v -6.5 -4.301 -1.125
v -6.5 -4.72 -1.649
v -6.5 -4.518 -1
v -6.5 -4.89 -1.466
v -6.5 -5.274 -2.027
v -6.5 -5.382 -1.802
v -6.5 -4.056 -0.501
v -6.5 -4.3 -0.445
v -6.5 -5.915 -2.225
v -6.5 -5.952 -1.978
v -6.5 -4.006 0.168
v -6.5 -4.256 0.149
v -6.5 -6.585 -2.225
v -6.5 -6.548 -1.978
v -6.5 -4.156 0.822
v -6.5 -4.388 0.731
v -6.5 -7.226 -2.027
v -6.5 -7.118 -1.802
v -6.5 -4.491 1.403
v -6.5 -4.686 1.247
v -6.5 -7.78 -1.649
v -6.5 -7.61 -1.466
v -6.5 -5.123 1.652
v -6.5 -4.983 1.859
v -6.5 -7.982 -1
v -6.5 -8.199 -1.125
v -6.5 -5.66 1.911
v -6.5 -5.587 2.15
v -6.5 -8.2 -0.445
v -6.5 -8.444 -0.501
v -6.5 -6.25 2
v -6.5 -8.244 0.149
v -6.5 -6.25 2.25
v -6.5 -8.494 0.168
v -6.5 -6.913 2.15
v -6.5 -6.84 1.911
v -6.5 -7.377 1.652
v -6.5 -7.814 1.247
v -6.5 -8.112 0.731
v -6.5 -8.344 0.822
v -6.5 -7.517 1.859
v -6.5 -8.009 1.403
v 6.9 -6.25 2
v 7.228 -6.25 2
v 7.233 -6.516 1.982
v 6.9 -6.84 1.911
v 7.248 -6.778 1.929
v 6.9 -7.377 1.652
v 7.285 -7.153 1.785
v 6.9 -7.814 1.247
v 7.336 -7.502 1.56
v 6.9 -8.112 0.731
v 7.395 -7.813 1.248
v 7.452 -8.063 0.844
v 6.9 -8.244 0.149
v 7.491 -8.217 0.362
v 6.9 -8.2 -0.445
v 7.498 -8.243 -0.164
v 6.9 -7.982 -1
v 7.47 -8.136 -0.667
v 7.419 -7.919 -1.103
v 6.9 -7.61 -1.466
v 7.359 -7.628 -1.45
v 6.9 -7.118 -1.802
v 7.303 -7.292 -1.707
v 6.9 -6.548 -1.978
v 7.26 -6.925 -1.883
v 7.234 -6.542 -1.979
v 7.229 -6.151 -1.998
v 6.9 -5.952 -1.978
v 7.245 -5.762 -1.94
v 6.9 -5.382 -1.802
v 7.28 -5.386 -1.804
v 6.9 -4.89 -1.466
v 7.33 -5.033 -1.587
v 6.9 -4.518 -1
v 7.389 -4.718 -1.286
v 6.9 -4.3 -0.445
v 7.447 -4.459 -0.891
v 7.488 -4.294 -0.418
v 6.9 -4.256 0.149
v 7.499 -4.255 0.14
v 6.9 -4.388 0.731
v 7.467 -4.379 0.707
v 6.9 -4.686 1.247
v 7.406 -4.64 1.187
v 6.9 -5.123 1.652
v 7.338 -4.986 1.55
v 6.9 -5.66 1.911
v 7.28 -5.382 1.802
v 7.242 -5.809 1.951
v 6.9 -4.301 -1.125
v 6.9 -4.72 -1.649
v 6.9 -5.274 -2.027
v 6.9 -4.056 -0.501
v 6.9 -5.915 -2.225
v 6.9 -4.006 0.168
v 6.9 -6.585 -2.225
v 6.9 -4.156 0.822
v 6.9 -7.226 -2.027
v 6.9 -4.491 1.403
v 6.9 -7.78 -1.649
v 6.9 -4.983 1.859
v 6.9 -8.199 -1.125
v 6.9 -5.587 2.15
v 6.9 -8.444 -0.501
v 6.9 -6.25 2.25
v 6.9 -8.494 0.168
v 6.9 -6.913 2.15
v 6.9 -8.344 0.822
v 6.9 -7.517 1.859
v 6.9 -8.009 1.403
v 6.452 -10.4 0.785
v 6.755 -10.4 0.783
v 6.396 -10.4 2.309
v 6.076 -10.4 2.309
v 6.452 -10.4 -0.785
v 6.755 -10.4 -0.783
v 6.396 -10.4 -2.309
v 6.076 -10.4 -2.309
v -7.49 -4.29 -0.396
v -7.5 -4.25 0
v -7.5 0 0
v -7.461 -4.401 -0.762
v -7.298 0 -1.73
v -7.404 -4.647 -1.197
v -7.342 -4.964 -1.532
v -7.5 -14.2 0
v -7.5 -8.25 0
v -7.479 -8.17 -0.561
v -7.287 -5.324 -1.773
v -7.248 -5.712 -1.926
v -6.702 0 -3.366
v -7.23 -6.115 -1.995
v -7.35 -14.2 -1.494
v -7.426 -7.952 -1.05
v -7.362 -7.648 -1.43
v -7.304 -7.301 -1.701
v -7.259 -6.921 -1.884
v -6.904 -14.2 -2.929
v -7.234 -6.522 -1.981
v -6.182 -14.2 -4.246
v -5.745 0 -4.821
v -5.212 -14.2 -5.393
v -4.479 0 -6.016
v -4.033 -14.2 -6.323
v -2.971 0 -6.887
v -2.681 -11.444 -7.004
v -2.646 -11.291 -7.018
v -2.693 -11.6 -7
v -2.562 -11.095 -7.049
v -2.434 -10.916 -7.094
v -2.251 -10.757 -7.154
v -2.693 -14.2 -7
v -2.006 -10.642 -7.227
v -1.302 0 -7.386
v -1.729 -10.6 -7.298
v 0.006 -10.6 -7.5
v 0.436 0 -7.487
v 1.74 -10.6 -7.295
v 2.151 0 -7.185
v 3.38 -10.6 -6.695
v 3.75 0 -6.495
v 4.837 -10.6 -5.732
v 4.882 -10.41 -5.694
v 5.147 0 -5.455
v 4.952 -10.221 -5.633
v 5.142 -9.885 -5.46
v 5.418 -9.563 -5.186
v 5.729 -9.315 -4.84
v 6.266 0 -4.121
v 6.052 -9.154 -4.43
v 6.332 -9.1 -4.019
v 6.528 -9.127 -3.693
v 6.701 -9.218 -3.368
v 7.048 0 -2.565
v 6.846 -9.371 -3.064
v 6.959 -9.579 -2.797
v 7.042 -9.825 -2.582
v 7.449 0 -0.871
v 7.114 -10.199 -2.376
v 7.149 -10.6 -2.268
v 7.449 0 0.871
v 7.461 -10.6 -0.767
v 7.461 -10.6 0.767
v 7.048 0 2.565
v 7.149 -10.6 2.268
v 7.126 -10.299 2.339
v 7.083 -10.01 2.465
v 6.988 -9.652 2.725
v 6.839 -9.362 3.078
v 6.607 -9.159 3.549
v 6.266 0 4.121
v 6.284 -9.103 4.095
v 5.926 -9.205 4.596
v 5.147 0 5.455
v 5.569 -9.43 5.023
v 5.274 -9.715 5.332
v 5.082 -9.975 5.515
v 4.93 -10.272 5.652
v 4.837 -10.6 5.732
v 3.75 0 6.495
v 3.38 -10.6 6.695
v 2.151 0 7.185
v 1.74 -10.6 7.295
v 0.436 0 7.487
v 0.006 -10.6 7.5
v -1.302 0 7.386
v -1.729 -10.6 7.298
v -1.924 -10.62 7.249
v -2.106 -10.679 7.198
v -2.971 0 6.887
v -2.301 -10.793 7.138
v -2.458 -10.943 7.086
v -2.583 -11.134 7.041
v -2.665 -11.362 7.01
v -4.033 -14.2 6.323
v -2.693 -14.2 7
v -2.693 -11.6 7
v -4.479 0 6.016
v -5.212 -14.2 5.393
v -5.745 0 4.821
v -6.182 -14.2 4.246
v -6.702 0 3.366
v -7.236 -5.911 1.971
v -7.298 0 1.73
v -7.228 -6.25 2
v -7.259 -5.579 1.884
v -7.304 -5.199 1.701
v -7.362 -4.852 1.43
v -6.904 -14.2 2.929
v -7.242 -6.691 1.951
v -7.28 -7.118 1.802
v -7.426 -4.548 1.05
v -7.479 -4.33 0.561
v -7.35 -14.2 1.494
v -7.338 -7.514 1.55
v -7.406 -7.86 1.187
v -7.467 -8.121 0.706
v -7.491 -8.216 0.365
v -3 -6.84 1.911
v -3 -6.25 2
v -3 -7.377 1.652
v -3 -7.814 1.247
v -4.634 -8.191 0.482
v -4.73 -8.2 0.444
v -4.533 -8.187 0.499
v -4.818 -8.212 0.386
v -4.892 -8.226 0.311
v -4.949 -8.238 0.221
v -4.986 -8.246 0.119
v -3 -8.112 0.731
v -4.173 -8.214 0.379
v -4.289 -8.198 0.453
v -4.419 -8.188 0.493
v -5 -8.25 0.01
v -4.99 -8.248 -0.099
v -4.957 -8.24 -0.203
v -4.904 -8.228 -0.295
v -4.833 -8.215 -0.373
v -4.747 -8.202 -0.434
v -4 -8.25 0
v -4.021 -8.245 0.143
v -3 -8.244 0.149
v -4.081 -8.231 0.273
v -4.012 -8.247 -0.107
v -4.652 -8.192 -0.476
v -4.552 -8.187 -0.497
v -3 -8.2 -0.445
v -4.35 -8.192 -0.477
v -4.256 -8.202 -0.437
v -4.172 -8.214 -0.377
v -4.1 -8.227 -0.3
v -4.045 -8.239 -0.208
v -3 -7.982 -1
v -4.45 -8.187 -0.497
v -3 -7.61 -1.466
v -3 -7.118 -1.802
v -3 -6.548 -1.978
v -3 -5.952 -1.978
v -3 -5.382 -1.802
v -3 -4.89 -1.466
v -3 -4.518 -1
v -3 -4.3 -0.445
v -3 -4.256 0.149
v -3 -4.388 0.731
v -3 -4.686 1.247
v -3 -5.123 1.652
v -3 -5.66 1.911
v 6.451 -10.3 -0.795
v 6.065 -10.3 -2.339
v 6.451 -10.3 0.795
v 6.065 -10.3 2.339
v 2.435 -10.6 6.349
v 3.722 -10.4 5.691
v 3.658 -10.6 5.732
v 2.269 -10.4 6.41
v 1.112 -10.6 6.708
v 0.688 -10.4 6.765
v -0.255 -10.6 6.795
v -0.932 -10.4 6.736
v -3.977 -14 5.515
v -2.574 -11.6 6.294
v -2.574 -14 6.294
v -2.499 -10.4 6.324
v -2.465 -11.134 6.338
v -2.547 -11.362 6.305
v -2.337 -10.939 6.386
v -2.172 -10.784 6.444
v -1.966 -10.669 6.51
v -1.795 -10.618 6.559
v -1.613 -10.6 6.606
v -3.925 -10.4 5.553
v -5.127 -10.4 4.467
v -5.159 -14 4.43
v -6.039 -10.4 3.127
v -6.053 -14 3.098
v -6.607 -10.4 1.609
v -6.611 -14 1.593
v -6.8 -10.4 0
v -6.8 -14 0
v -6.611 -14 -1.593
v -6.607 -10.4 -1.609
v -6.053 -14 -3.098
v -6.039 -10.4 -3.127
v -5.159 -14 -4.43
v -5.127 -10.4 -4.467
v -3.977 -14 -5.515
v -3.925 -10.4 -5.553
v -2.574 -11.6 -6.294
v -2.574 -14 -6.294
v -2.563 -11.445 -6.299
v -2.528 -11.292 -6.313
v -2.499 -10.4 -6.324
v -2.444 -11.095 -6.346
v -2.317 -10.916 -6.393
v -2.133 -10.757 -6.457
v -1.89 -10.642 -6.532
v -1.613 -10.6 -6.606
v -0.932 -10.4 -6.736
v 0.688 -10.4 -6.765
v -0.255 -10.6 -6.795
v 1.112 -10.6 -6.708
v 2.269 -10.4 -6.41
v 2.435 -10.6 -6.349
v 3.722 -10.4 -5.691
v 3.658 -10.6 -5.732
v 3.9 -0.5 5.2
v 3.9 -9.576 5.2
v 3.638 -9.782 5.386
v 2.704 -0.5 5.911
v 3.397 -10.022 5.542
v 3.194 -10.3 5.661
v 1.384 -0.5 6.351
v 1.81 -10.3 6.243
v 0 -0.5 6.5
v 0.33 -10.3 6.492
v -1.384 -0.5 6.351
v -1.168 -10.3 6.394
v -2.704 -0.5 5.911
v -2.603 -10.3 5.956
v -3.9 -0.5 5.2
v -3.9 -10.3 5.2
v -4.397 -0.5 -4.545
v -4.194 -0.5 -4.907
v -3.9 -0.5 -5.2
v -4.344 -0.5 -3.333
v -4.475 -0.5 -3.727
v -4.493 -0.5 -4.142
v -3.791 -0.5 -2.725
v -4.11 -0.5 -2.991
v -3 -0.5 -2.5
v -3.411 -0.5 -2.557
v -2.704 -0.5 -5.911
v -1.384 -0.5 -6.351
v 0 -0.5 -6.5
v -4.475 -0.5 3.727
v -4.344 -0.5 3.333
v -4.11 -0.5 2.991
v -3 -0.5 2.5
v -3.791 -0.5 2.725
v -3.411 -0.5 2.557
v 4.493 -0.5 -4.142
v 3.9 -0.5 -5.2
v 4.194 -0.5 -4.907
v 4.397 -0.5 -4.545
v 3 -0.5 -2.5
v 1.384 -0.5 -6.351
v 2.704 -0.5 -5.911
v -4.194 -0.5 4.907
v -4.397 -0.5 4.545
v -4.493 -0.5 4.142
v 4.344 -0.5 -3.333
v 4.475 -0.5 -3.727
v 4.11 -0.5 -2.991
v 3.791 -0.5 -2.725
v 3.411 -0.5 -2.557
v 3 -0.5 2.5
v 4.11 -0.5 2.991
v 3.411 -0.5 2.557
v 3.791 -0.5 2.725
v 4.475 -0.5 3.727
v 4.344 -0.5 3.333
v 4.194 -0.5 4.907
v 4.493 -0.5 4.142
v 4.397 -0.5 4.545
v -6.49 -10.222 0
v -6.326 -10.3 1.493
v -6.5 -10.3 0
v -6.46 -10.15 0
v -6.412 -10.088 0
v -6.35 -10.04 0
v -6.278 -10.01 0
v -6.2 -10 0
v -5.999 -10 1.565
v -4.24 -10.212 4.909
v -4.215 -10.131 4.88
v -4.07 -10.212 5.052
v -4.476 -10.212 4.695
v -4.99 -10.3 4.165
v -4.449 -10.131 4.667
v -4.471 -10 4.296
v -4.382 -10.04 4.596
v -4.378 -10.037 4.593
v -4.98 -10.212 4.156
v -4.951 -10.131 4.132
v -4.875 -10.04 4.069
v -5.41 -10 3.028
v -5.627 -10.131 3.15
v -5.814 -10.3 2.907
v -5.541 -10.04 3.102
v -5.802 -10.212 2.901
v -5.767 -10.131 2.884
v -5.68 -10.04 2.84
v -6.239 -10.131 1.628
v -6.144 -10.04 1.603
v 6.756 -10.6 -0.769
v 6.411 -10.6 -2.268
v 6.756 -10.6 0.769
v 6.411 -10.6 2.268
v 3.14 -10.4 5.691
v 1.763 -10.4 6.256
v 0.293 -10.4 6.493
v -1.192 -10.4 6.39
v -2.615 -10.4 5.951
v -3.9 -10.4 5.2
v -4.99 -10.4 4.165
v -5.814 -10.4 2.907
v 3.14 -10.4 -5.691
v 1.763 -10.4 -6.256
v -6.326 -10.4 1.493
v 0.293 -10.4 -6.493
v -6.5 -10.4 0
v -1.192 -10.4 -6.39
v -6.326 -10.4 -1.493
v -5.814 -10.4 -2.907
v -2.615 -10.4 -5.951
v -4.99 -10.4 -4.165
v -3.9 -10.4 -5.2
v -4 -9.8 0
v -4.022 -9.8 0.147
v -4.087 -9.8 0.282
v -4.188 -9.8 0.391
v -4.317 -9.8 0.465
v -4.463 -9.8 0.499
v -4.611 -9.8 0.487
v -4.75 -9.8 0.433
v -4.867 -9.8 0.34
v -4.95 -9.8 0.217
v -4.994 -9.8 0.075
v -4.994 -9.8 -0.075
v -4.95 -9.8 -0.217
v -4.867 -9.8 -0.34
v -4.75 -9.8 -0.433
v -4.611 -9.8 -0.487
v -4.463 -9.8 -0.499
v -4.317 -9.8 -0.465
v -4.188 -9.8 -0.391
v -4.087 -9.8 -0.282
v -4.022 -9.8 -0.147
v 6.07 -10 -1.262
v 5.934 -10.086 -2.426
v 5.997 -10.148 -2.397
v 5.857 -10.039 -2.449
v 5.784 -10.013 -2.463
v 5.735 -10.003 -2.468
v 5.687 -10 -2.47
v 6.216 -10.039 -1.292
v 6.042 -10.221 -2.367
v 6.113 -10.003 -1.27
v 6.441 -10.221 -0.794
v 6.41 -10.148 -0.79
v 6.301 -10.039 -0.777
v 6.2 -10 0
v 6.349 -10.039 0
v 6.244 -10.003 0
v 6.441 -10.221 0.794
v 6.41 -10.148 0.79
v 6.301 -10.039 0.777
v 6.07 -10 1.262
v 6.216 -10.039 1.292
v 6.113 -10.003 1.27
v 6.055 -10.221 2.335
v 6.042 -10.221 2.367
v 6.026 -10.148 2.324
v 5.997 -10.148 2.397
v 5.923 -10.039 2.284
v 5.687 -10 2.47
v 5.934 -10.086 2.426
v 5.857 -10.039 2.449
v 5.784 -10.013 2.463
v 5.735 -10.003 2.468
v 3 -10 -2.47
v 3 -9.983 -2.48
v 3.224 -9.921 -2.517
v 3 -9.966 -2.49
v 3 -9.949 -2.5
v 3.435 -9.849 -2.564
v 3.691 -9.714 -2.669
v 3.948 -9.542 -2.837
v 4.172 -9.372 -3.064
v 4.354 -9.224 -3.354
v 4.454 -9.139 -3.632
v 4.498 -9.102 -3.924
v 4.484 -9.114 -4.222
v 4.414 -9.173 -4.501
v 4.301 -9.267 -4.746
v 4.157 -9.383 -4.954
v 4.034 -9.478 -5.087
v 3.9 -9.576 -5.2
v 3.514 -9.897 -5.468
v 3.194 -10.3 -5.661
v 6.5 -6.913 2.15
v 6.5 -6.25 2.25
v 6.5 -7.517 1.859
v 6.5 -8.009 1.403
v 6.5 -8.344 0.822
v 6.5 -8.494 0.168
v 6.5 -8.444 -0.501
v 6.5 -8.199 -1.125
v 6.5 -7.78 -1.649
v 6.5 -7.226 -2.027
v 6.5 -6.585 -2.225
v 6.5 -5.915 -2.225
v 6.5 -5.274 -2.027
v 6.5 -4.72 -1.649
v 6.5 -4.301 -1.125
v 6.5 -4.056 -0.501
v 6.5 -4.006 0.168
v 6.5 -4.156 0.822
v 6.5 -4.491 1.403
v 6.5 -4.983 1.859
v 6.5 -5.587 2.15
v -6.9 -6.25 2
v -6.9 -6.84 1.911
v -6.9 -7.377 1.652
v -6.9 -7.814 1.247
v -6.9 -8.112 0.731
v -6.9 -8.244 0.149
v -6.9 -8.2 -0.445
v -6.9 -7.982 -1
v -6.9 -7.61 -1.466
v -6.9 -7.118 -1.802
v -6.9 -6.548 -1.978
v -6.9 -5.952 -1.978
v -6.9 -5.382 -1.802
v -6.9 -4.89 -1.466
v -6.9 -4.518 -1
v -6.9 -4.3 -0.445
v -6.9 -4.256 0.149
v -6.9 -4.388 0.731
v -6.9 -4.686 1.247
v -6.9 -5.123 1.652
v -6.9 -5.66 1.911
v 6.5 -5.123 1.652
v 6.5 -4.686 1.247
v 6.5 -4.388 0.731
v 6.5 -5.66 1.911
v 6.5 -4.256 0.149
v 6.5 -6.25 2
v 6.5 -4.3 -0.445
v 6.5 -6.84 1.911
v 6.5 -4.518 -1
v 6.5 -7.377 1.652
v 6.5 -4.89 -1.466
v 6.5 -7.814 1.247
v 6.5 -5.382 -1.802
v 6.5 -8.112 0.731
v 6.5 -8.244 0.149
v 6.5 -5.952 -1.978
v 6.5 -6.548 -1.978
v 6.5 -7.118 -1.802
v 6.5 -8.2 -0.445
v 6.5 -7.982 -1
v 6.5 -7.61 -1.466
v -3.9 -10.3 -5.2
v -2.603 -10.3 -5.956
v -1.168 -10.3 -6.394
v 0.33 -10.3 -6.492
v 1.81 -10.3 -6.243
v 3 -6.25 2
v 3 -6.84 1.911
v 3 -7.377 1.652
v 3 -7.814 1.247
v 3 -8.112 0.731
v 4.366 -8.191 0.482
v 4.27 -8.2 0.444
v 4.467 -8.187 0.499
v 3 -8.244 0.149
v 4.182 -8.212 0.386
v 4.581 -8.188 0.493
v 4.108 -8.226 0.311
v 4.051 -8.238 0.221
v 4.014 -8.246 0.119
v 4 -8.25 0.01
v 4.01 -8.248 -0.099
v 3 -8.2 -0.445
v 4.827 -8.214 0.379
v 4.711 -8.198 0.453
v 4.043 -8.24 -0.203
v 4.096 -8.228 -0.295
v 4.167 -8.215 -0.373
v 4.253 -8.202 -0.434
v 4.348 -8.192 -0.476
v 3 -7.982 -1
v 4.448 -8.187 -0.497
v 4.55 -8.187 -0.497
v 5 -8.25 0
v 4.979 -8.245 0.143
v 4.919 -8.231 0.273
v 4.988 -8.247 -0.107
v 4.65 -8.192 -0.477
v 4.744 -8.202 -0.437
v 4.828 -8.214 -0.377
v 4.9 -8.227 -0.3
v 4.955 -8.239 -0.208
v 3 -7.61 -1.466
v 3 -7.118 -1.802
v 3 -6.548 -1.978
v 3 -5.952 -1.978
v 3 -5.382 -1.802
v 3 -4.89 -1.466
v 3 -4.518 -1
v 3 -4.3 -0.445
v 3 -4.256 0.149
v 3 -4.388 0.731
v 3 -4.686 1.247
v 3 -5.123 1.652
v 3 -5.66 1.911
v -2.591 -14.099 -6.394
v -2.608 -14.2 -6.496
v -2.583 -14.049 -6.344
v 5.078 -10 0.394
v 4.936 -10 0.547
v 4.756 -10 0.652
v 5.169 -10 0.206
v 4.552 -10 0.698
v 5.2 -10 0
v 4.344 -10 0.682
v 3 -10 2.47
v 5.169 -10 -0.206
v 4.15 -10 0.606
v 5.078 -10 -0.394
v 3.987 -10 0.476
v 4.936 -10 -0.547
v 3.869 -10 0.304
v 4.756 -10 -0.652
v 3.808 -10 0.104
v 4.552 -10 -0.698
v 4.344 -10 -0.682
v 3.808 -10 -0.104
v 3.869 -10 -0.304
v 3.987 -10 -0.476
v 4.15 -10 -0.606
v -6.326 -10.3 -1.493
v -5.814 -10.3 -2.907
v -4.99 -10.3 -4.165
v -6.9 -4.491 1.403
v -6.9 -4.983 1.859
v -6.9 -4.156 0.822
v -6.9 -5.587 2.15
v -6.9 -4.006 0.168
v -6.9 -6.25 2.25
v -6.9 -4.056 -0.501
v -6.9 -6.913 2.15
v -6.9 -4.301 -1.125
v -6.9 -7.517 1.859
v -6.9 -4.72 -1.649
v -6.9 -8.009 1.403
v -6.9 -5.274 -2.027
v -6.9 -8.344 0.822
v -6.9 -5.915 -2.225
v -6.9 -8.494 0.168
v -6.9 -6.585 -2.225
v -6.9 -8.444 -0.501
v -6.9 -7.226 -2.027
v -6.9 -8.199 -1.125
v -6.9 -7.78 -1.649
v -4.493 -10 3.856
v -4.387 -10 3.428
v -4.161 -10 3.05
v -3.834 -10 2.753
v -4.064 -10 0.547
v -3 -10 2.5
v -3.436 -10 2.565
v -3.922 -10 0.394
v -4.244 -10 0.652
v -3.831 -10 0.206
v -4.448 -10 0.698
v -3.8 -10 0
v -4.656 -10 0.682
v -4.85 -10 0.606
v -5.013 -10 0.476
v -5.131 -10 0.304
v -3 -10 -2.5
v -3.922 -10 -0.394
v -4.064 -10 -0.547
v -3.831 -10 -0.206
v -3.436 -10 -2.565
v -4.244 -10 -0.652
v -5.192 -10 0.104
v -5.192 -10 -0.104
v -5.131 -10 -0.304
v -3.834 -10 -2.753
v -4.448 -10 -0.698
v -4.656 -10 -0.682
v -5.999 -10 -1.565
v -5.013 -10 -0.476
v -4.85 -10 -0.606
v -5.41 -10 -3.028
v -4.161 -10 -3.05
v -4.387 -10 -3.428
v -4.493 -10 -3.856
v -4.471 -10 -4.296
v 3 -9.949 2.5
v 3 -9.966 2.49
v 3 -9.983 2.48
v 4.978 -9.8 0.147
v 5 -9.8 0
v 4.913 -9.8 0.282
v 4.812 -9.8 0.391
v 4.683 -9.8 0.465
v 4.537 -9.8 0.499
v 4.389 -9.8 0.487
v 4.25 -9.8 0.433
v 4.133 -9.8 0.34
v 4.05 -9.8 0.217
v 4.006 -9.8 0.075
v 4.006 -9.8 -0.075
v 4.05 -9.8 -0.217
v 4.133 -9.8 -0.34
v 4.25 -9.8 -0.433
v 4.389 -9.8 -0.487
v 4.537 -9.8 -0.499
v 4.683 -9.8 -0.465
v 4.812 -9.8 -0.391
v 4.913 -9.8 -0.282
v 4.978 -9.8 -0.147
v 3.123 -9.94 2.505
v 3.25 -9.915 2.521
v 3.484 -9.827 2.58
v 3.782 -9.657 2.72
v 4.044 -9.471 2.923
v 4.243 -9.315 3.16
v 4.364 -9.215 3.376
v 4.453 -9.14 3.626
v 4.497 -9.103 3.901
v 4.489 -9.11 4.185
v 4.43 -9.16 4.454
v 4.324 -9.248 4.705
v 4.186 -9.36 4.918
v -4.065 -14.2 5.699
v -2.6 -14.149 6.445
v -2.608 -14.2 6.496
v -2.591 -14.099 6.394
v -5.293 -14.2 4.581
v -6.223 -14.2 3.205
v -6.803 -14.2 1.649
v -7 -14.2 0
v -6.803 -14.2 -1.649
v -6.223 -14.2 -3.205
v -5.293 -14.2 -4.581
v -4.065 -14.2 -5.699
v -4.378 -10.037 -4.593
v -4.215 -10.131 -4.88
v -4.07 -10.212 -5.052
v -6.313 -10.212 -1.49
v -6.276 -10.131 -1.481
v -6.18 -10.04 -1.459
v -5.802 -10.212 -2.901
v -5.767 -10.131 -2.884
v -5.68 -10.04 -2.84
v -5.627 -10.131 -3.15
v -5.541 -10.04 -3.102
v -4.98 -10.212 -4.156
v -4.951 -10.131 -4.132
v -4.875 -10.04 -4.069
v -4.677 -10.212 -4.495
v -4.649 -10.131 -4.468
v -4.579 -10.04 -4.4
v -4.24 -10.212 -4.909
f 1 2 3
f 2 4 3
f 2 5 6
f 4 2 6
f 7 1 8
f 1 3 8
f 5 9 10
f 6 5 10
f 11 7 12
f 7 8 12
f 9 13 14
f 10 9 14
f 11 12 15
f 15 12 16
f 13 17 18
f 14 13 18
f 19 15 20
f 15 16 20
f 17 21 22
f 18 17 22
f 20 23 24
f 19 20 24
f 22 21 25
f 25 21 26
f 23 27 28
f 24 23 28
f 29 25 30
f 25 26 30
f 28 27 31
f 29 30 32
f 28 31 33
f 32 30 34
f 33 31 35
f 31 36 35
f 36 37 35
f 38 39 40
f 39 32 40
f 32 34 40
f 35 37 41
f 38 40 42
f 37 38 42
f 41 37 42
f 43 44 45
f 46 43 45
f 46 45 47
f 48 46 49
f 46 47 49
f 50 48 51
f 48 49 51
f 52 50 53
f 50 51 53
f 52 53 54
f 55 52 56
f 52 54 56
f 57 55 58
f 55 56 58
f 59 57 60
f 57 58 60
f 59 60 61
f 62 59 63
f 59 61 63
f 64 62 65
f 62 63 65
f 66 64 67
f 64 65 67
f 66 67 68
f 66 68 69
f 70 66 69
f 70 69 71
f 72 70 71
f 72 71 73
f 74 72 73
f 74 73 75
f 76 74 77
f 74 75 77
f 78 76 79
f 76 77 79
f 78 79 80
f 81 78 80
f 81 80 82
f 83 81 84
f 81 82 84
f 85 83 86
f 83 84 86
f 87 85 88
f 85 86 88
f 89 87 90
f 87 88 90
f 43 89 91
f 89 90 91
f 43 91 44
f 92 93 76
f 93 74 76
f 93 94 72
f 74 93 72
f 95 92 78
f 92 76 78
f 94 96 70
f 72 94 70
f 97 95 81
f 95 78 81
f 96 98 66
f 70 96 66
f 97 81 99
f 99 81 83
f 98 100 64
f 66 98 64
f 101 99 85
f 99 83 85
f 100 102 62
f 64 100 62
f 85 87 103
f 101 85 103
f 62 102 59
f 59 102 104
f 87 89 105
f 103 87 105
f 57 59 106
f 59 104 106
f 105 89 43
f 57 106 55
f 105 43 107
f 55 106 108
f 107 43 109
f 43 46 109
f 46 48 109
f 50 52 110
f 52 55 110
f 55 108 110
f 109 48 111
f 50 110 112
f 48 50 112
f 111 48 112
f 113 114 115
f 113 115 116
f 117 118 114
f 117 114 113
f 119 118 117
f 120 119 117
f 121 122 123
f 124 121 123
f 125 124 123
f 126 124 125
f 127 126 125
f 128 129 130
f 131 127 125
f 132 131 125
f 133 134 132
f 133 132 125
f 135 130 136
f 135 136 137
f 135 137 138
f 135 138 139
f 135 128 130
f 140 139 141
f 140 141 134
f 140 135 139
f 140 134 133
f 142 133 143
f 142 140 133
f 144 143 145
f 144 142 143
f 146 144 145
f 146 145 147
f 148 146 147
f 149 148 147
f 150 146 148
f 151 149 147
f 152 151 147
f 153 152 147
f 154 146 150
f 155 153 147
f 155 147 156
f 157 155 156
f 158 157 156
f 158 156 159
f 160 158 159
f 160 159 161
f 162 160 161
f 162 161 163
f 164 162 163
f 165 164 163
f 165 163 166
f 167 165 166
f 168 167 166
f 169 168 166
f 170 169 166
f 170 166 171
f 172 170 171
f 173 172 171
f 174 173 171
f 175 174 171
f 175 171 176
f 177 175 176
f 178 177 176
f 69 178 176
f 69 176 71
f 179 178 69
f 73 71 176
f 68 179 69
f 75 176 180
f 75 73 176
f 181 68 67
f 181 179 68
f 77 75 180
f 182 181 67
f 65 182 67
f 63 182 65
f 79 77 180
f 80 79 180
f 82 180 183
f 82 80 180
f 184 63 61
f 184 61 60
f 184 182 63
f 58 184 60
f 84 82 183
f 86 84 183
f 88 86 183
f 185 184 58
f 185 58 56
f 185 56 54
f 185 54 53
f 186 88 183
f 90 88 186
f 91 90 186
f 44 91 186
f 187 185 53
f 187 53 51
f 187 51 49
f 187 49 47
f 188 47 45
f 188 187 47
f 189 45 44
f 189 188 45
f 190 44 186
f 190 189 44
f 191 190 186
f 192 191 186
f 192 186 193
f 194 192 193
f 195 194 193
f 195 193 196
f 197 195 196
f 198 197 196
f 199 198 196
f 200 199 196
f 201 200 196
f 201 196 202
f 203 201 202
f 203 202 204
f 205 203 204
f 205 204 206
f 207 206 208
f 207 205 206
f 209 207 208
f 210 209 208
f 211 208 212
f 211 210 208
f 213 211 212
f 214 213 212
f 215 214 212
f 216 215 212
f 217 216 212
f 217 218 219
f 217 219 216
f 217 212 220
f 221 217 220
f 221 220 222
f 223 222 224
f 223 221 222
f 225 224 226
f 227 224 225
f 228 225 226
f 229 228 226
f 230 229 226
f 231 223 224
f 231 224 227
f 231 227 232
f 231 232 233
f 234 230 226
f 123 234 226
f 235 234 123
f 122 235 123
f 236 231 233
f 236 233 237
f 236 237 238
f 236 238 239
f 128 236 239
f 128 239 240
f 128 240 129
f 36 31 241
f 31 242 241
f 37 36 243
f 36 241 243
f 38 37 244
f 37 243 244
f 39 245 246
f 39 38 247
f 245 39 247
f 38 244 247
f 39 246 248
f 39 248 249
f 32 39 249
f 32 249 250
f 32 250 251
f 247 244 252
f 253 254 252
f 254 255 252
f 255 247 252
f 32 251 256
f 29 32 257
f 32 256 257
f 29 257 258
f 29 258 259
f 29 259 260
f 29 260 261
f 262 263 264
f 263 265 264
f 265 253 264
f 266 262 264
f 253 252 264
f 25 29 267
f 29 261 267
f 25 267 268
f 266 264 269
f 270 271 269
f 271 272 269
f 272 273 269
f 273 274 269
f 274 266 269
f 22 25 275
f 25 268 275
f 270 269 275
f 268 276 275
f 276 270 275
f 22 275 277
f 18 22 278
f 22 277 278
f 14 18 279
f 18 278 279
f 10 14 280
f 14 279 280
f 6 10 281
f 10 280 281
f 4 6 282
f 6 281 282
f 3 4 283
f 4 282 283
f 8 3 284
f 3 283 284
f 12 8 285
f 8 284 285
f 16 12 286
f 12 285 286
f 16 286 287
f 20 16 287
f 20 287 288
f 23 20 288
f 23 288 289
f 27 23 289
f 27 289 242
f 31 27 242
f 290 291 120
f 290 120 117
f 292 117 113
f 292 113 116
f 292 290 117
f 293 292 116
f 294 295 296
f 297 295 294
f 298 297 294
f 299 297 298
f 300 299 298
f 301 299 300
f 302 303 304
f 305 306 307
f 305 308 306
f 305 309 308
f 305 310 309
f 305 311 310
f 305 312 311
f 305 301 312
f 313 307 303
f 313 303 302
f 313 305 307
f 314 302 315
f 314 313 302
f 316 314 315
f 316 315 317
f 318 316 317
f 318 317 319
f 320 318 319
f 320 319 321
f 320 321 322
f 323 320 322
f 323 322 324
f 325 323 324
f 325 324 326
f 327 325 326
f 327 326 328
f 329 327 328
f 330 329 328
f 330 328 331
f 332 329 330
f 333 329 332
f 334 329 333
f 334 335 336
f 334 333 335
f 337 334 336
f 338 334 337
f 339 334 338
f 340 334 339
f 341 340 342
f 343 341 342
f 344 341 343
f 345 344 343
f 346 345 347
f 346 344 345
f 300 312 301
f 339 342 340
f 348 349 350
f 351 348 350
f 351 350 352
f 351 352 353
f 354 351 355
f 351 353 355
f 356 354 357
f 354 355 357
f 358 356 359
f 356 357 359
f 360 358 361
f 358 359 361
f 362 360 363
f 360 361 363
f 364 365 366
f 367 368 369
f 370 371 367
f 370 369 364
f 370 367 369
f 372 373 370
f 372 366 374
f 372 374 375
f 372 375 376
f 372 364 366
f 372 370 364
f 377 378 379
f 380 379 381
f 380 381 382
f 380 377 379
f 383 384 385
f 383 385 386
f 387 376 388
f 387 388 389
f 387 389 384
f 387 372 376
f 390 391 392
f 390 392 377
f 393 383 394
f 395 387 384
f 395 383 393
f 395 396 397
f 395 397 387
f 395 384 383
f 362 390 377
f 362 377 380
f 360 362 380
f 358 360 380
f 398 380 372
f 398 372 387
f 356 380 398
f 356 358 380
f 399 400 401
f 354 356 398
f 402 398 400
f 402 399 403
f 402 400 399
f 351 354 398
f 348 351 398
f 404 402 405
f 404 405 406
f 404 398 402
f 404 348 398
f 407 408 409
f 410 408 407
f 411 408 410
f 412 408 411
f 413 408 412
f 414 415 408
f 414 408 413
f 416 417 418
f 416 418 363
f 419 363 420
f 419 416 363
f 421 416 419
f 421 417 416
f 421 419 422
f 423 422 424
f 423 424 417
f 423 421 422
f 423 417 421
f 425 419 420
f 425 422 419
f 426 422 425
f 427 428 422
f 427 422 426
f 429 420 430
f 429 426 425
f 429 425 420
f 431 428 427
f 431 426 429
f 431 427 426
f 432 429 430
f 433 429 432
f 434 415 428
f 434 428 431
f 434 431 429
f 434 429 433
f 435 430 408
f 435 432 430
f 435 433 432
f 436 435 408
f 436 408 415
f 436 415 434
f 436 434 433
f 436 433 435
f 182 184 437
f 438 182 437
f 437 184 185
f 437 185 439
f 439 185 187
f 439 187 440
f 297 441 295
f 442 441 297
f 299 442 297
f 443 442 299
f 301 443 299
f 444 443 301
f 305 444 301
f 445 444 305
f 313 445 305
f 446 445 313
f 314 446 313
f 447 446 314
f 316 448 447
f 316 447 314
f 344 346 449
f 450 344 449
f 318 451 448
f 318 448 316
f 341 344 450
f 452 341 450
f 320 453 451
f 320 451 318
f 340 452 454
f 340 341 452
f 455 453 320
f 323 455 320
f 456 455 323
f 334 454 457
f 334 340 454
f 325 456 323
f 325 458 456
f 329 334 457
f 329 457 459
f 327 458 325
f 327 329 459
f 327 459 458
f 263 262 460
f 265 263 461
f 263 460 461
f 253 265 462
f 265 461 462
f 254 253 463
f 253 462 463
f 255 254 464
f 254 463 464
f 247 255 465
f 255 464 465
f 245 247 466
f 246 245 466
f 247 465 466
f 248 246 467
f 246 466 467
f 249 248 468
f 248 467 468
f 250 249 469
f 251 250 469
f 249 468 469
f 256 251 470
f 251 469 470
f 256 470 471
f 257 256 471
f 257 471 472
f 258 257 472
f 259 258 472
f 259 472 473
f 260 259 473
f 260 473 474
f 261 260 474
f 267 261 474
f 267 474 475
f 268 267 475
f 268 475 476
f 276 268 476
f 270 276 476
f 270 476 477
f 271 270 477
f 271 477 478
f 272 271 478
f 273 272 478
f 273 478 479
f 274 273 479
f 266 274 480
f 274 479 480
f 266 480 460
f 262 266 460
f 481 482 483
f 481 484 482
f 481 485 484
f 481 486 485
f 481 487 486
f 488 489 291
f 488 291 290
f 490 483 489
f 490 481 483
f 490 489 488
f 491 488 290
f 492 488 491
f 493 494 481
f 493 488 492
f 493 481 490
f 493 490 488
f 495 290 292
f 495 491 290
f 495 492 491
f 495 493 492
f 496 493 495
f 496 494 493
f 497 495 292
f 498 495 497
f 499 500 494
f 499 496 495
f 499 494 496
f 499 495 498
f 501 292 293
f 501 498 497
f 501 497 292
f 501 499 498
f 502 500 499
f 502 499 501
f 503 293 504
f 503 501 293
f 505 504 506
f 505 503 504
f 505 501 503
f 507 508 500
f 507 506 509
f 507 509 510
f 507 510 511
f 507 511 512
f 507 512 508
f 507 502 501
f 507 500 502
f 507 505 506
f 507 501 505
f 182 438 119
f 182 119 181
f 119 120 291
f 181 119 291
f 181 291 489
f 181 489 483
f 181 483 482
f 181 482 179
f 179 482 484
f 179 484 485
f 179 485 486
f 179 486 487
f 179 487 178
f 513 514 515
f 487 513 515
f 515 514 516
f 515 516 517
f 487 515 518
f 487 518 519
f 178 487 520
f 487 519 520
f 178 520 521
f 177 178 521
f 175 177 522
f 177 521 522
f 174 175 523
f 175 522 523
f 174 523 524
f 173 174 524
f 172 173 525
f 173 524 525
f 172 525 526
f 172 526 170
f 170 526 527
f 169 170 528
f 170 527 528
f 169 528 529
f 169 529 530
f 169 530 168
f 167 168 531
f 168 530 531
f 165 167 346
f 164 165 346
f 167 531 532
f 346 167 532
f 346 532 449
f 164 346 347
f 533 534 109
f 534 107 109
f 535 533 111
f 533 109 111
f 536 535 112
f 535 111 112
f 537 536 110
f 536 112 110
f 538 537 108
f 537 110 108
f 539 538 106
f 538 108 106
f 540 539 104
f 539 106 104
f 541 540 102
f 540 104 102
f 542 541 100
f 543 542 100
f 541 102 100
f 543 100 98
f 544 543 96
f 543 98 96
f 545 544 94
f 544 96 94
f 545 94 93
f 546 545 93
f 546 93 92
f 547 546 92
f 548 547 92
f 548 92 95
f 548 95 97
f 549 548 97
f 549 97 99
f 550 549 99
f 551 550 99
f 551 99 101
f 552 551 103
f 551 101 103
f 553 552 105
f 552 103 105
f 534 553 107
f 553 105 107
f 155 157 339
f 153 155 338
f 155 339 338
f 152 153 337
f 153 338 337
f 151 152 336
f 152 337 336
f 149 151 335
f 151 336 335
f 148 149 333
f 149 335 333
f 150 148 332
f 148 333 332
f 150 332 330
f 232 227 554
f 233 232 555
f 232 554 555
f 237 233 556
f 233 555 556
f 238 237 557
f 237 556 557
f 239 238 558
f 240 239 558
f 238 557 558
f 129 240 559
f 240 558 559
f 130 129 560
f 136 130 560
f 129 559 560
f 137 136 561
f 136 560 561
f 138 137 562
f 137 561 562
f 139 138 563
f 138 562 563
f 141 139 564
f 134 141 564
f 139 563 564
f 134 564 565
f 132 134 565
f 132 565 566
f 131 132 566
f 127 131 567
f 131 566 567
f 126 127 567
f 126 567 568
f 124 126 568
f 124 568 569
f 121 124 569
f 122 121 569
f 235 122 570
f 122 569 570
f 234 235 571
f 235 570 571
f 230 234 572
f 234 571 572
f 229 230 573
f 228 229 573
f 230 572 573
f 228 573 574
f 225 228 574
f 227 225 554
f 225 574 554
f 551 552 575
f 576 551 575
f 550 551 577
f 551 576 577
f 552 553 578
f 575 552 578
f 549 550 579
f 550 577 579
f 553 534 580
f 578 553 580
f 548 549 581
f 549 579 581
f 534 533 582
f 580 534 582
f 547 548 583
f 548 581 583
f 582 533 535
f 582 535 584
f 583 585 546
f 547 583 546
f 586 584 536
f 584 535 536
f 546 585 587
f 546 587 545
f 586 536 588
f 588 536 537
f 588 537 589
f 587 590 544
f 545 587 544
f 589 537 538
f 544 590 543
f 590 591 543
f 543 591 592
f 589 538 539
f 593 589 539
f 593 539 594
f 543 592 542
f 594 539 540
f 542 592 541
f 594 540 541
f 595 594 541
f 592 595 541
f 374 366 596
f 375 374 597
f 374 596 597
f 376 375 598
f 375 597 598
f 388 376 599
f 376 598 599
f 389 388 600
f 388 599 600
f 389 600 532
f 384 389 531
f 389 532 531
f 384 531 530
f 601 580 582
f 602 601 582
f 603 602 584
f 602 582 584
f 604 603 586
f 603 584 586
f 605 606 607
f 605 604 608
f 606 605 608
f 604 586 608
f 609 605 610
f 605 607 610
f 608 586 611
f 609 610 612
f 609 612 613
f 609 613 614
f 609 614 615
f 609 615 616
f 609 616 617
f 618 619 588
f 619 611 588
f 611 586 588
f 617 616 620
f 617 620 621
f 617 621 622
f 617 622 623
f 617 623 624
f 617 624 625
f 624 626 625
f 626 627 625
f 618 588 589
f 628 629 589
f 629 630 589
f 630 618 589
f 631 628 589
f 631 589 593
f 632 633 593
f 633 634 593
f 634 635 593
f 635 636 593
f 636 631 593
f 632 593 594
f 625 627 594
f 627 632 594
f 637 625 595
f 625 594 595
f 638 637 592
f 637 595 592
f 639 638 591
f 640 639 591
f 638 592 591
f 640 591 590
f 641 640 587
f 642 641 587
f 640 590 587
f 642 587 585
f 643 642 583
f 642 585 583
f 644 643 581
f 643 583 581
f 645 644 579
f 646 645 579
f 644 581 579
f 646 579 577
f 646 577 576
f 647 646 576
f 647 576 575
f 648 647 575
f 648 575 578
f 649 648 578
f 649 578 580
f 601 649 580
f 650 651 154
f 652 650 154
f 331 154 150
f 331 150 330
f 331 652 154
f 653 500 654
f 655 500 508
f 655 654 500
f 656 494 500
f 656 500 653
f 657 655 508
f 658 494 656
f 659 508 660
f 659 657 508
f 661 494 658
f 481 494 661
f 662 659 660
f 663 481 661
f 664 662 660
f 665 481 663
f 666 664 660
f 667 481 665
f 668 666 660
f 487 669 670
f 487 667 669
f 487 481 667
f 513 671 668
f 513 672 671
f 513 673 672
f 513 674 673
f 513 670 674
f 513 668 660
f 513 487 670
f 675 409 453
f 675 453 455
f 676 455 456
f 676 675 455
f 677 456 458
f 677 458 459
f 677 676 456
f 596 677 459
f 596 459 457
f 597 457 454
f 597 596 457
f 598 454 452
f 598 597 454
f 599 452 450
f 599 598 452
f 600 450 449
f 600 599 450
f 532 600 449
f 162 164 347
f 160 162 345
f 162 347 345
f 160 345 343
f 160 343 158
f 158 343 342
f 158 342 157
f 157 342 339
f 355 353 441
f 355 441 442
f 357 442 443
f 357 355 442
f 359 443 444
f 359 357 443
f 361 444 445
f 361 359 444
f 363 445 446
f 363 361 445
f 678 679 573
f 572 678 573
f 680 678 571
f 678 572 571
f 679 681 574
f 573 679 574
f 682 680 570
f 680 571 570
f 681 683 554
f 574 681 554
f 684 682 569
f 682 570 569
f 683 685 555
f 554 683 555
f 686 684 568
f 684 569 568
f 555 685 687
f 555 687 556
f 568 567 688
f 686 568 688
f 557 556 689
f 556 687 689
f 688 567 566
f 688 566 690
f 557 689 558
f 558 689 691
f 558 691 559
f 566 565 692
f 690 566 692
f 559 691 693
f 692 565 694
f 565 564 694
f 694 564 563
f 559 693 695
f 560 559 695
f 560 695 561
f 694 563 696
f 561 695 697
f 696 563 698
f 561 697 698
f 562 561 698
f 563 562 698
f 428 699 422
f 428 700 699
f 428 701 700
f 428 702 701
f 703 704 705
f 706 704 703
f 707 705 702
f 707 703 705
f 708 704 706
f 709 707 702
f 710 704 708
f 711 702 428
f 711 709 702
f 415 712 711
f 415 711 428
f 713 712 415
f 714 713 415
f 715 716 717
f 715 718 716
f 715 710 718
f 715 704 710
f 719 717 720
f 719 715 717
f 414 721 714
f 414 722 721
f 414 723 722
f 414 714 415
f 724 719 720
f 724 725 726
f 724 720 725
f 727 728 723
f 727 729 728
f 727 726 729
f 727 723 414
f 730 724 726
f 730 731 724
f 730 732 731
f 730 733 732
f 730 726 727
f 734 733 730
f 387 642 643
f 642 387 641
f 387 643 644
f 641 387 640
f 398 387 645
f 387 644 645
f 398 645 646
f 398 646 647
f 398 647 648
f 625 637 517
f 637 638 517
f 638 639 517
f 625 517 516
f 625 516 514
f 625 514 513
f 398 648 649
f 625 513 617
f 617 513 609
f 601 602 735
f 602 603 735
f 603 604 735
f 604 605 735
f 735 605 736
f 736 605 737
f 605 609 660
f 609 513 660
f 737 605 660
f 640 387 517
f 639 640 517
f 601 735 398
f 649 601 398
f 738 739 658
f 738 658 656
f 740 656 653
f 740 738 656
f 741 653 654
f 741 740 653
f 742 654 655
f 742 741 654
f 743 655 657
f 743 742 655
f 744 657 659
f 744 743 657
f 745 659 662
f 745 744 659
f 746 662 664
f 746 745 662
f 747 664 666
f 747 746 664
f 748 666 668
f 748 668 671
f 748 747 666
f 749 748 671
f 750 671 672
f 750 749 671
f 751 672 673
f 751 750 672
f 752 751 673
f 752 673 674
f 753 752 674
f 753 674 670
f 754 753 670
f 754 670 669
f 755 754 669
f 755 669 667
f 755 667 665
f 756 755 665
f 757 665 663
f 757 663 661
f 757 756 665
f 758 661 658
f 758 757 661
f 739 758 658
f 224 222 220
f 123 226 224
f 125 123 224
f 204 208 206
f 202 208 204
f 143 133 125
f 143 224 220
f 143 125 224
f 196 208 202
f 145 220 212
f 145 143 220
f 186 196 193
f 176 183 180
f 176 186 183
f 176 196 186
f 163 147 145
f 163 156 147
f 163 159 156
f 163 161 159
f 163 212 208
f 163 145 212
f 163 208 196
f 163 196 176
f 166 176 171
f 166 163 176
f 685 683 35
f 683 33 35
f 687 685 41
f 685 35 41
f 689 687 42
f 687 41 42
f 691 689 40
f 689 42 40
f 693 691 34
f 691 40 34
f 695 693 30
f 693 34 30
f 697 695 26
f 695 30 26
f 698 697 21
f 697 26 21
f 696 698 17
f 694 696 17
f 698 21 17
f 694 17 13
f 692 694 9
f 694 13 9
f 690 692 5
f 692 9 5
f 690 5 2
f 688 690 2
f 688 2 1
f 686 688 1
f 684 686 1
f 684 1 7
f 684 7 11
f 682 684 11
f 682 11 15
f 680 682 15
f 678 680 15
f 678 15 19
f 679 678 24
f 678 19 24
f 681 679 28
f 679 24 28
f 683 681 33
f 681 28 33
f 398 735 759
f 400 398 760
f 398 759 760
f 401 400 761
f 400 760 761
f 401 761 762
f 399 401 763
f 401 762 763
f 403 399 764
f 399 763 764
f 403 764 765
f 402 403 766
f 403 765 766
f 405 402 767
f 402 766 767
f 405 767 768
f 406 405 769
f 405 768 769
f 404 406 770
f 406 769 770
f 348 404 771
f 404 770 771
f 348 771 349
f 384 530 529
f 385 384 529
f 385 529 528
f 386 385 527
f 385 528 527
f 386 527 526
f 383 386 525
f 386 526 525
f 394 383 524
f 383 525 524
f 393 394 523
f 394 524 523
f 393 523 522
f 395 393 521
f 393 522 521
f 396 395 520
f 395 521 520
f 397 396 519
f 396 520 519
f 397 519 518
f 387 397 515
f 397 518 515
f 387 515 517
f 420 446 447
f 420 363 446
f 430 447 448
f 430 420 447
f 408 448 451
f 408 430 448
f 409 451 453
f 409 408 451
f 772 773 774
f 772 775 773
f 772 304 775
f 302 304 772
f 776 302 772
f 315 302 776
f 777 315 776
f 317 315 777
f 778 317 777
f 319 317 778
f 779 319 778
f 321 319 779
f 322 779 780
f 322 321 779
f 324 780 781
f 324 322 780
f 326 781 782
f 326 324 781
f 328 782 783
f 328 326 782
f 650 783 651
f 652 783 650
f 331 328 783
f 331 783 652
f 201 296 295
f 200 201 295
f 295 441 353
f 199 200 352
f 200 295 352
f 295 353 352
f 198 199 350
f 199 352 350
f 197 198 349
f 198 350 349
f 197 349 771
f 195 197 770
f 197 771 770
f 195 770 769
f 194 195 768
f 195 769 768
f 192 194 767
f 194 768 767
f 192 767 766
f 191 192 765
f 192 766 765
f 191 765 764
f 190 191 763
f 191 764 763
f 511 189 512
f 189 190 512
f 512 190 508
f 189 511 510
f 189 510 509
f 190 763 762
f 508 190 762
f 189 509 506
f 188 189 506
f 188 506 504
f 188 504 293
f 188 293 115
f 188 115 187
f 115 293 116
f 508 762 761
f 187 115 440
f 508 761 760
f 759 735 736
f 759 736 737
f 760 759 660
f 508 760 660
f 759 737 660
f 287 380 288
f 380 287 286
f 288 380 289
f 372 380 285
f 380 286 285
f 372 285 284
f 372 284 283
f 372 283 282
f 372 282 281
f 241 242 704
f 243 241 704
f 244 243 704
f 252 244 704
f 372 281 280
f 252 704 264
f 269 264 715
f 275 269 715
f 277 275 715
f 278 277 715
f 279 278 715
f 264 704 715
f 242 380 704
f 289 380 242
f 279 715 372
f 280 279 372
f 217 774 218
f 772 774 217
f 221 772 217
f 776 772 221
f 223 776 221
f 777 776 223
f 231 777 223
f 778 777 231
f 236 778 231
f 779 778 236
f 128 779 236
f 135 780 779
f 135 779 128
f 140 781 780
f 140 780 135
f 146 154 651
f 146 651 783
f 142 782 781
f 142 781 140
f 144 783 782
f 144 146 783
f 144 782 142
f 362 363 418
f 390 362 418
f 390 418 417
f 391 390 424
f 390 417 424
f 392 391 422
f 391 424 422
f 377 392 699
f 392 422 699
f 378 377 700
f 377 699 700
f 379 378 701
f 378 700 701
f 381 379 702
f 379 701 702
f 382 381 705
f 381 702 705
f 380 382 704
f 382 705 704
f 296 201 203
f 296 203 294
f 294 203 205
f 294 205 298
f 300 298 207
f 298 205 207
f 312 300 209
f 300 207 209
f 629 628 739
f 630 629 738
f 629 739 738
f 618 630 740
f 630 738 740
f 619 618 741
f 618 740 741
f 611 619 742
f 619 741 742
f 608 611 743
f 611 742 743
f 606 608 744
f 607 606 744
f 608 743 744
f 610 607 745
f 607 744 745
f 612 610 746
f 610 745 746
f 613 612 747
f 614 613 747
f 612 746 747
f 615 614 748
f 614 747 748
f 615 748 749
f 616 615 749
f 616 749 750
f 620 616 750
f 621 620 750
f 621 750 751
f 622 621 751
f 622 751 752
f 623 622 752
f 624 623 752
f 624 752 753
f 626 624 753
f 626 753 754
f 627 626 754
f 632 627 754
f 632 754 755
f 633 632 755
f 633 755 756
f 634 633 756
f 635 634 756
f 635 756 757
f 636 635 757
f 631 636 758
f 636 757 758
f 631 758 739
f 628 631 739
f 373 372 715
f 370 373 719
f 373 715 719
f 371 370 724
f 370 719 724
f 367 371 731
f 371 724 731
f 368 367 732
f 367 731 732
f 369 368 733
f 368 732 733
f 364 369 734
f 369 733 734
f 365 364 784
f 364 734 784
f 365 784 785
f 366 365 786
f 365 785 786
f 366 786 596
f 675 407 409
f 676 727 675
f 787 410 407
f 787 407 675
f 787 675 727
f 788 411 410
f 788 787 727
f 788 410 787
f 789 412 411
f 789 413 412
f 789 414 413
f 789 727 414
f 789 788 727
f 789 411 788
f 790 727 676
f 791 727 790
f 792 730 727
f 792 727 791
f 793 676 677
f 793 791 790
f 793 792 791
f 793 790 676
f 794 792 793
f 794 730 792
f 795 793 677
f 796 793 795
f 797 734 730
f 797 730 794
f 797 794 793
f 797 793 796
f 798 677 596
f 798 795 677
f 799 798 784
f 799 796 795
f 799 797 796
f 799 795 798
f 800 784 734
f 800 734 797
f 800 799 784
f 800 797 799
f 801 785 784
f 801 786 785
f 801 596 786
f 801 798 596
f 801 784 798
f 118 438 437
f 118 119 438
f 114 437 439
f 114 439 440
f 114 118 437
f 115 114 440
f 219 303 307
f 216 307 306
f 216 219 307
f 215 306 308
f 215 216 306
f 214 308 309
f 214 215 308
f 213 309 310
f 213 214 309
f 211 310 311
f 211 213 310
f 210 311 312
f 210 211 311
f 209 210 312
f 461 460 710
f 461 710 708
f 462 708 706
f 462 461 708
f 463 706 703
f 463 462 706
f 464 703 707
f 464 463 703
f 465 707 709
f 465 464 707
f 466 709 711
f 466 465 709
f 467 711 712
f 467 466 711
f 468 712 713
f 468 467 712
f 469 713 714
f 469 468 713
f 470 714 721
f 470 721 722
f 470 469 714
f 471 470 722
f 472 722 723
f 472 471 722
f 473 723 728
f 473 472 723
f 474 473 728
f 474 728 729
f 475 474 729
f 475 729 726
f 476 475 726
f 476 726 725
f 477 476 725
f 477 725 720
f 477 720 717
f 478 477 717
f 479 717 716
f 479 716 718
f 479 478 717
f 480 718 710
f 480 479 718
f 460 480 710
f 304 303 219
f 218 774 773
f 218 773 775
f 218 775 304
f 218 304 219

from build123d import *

# Parameters (mm, degrees)
CUT_EXTRUDE1_DEPTH      = 3.6
FILLET1_R               = 1
CUT_EXTRUDE2_DEPTH      = 10.1
CUT_EXTRUDE3_DEPTH      = 8.5000001
CUT_EXTRUDE4_REACH      = 12
CUT_EXTRUDE4_END_RADIUS = 2
SKETCH6_R               = 0.5
CHAMFER1_SIZE           = 0.2


with BuildPart() as part:
    # Sketch1 → Revolve1 (revolve)
    with BuildSketch(Plane.XY, mode=Mode.PRIVATE) as revolve1_sk:
        with BuildLine():
            Line((0, 0), (7.5, 0))
            Line((7.5, 0), (7.5, -14.2))
            Line((7.5, -14.2), (7, -14.2))
            Line((7, -14.2), (6.8, -14))
            Line((6.8, -14), (6.8, -10.4))
            Line((6.8, -10.4), (6.5, -10.4))
            Line((6.5, -10.4), (6.5, -10.3))
            ThreePointArc((6.5, -10.3), (6.412132034, -10.087867966), (6.2, -10))
            Line((6.2, -10), (0, -10))
            Line((0, -10), (0, 0))
        make_face()
    revolve(revolve1_sk.sketch.rotate(Axis((0, -10, 0), (0, -1, 0)), 180), axis=Axis((0, -10, 0), (0, -1, 0)))  # turned: the seam where the file's is

    # Sketch2 → Cut-Revolve1 (revolve, cut)
    with BuildSketch(Plane.XY, mode=Mode.PRIVATE) as cut_revolve1_sk:
        Polygon((-6.5, -4.25), (6.5, -4.25), (6.5, -4), (6.9, -4), (6.9, -4.25), (7.5, -4.25), (7.5, -6.25), (-7.5, -6.25), (-7.5, -4.25), (-6.9, -4.25), (-6.9, -4), (-6.5, -4), align=None)
    revolve(cut_revolve1_sk.sketch.rotate(Axis((7.5, -6.25, 0), (1, 0, 0)), 90), axis=Axis((7.5, -6.25, 0), (1, 0, 0)), mode=Mode.SUBTRACT)  # turned: the seam where the file's is

    # Sketch3 → Cut-Extrude1 (cut)
    with BuildSketch(Plane.XZ.offset(14.2)):
        with BuildLine():
            Line((-2.574381753, 6.293850856), (-2.692582404, 7))
            ThreePointArc((-2.692582404, 7), (7.5, 0), (-2.692582404, -7))
            Line((-2.692582404, -7), (-2.574381753, -6.293850856))
            ThreePointArc((-2.574381753, -6.293850856), (6.8, 0), (-2.574381753, 6.293850856))
        make_face()
    extrude(amount=-CUT_EXTRUDE1_DEPTH, mode=Mode.SUBTRACT)

    # Fillet1
    fillet1_edges = [part.edges().sort_by_distance(p)[0] for p in [
        (-2.633482078, -10.6, -6.646925428),
        (-2.633482078, -10.6, 6.646925428),
    ]]
    fillet(fillet1_edges, radius=FILLET1_R)

    # Sketch4 → Cut-Extrude2 (cut)
    with BuildSketch(Plane.XZ.offset(10.6)):
        with BuildLine():
            Line((3, -2.5), (3, 2.5))
            ThreePointArc((3, 2.5), (4.423024947, 3.525658351), (3.9, 5.2))
            ThreePointArc((3.9, 5.2), (0, 6.5), (-3.9, 5.2))
            ThreePointArc((-3.9, 5.2), (-4.423024947, 3.525658351), (-3, 2.5))
            Line((-3, 2.5), (-3, -2.5))
            ThreePointArc((-3, -2.5), (-4.423024947, -3.525658351), (-3.9, -5.2))
            ThreePointArc((-3.9, -5.2), (0, -6.5), (3.9, -5.2))
            ThreePointArc((3.9, -5.2), (4.423024947, -3.525658351), (3, -2.5))
        make_face()
    extrude(amount=-CUT_EXTRUDE2_DEPTH, mode=Mode.SUBTRACT)

    # Sketch5 → Cut-Extrude3 (cut, through all)
    with BuildSketch(Plane(origin=(0, 0, 0), x_dir=(0, 0, -1), z_dir=(1, 0, 0))):
        with BuildLine():
            Line((-2.267949192, -10.6), (2.267949192, -10.6))
            ThreePointArc((2.267949192, -10.6), (5.322875656, -9.704356076), (4, -12.6))
            Line((4, -12.6), (-4, -12.6))
            ThreePointArc((-4, -12.6), (-5.322875656, -9.704356076), (-2.267949192, -10.6))
        make_face()
    extrude(amount=CUT_EXTRUDE3_DEPTH, mode=Mode.SUBTRACT)

    # Cut-Extrude4: up to this cylinder (the profile starts outside it)
    cut_extrude4_end = Plane(origin=(0, -6.25, 0), z_dir=(-1, 0, 0)) * Cylinder(CUT_EXTRUDE4_END_RADIUS, 38, mode=Mode.PRIVATE)
    # Sketch6 → Cut-Extrude4 (cut, up to the surface)
    with BuildSketch(Plane.XZ.offset(10), mode=Mode.PRIVATE) as cut_extrude4_sk1:
        with Locations((-4.5, 0)):
            Circle(SKETCH6_R)
    cut_extrude4_tool1 = extrude(cut_extrude4_sk1.sketch, amount=-CUT_EXTRUDE4_REACH, mode=Mode.PRIVATE) - cut_extrude4_end
    add(cut_extrude4_tool1.solids().sort_by_distance((-4.5, -10, 0))[0], mode=Mode.SUBTRACT)
    # Sketch6 → Cut-Extrude4 (cut, up to the surface)
    with BuildSketch(Plane.XZ.offset(10), mode=Mode.PRIVATE) as cut_extrude4_sk2:
        with Locations((4.5, 0)):
            Circle(SKETCH6_R)
    cut_extrude4_tool2 = extrude(cut_extrude4_sk2.sketch, amount=-CUT_EXTRUDE4_REACH, mode=Mode.PRIVATE) - cut_extrude4_end
    add(cut_extrude4_tool2.solids().sort_by_distance((4.5, -10, 0))[0], mode=Mode.SUBTRACT)

    # Chamfer1
    chamfer1_edges = [part.edges().sort_by_distance(p)[0] for p in [
        (-5, -10, 0),
        (4, -10, 0),
    ]]
    chamfer(chamfer1_edges, length=CHAMFER1_SIZE)


solid = part.part
